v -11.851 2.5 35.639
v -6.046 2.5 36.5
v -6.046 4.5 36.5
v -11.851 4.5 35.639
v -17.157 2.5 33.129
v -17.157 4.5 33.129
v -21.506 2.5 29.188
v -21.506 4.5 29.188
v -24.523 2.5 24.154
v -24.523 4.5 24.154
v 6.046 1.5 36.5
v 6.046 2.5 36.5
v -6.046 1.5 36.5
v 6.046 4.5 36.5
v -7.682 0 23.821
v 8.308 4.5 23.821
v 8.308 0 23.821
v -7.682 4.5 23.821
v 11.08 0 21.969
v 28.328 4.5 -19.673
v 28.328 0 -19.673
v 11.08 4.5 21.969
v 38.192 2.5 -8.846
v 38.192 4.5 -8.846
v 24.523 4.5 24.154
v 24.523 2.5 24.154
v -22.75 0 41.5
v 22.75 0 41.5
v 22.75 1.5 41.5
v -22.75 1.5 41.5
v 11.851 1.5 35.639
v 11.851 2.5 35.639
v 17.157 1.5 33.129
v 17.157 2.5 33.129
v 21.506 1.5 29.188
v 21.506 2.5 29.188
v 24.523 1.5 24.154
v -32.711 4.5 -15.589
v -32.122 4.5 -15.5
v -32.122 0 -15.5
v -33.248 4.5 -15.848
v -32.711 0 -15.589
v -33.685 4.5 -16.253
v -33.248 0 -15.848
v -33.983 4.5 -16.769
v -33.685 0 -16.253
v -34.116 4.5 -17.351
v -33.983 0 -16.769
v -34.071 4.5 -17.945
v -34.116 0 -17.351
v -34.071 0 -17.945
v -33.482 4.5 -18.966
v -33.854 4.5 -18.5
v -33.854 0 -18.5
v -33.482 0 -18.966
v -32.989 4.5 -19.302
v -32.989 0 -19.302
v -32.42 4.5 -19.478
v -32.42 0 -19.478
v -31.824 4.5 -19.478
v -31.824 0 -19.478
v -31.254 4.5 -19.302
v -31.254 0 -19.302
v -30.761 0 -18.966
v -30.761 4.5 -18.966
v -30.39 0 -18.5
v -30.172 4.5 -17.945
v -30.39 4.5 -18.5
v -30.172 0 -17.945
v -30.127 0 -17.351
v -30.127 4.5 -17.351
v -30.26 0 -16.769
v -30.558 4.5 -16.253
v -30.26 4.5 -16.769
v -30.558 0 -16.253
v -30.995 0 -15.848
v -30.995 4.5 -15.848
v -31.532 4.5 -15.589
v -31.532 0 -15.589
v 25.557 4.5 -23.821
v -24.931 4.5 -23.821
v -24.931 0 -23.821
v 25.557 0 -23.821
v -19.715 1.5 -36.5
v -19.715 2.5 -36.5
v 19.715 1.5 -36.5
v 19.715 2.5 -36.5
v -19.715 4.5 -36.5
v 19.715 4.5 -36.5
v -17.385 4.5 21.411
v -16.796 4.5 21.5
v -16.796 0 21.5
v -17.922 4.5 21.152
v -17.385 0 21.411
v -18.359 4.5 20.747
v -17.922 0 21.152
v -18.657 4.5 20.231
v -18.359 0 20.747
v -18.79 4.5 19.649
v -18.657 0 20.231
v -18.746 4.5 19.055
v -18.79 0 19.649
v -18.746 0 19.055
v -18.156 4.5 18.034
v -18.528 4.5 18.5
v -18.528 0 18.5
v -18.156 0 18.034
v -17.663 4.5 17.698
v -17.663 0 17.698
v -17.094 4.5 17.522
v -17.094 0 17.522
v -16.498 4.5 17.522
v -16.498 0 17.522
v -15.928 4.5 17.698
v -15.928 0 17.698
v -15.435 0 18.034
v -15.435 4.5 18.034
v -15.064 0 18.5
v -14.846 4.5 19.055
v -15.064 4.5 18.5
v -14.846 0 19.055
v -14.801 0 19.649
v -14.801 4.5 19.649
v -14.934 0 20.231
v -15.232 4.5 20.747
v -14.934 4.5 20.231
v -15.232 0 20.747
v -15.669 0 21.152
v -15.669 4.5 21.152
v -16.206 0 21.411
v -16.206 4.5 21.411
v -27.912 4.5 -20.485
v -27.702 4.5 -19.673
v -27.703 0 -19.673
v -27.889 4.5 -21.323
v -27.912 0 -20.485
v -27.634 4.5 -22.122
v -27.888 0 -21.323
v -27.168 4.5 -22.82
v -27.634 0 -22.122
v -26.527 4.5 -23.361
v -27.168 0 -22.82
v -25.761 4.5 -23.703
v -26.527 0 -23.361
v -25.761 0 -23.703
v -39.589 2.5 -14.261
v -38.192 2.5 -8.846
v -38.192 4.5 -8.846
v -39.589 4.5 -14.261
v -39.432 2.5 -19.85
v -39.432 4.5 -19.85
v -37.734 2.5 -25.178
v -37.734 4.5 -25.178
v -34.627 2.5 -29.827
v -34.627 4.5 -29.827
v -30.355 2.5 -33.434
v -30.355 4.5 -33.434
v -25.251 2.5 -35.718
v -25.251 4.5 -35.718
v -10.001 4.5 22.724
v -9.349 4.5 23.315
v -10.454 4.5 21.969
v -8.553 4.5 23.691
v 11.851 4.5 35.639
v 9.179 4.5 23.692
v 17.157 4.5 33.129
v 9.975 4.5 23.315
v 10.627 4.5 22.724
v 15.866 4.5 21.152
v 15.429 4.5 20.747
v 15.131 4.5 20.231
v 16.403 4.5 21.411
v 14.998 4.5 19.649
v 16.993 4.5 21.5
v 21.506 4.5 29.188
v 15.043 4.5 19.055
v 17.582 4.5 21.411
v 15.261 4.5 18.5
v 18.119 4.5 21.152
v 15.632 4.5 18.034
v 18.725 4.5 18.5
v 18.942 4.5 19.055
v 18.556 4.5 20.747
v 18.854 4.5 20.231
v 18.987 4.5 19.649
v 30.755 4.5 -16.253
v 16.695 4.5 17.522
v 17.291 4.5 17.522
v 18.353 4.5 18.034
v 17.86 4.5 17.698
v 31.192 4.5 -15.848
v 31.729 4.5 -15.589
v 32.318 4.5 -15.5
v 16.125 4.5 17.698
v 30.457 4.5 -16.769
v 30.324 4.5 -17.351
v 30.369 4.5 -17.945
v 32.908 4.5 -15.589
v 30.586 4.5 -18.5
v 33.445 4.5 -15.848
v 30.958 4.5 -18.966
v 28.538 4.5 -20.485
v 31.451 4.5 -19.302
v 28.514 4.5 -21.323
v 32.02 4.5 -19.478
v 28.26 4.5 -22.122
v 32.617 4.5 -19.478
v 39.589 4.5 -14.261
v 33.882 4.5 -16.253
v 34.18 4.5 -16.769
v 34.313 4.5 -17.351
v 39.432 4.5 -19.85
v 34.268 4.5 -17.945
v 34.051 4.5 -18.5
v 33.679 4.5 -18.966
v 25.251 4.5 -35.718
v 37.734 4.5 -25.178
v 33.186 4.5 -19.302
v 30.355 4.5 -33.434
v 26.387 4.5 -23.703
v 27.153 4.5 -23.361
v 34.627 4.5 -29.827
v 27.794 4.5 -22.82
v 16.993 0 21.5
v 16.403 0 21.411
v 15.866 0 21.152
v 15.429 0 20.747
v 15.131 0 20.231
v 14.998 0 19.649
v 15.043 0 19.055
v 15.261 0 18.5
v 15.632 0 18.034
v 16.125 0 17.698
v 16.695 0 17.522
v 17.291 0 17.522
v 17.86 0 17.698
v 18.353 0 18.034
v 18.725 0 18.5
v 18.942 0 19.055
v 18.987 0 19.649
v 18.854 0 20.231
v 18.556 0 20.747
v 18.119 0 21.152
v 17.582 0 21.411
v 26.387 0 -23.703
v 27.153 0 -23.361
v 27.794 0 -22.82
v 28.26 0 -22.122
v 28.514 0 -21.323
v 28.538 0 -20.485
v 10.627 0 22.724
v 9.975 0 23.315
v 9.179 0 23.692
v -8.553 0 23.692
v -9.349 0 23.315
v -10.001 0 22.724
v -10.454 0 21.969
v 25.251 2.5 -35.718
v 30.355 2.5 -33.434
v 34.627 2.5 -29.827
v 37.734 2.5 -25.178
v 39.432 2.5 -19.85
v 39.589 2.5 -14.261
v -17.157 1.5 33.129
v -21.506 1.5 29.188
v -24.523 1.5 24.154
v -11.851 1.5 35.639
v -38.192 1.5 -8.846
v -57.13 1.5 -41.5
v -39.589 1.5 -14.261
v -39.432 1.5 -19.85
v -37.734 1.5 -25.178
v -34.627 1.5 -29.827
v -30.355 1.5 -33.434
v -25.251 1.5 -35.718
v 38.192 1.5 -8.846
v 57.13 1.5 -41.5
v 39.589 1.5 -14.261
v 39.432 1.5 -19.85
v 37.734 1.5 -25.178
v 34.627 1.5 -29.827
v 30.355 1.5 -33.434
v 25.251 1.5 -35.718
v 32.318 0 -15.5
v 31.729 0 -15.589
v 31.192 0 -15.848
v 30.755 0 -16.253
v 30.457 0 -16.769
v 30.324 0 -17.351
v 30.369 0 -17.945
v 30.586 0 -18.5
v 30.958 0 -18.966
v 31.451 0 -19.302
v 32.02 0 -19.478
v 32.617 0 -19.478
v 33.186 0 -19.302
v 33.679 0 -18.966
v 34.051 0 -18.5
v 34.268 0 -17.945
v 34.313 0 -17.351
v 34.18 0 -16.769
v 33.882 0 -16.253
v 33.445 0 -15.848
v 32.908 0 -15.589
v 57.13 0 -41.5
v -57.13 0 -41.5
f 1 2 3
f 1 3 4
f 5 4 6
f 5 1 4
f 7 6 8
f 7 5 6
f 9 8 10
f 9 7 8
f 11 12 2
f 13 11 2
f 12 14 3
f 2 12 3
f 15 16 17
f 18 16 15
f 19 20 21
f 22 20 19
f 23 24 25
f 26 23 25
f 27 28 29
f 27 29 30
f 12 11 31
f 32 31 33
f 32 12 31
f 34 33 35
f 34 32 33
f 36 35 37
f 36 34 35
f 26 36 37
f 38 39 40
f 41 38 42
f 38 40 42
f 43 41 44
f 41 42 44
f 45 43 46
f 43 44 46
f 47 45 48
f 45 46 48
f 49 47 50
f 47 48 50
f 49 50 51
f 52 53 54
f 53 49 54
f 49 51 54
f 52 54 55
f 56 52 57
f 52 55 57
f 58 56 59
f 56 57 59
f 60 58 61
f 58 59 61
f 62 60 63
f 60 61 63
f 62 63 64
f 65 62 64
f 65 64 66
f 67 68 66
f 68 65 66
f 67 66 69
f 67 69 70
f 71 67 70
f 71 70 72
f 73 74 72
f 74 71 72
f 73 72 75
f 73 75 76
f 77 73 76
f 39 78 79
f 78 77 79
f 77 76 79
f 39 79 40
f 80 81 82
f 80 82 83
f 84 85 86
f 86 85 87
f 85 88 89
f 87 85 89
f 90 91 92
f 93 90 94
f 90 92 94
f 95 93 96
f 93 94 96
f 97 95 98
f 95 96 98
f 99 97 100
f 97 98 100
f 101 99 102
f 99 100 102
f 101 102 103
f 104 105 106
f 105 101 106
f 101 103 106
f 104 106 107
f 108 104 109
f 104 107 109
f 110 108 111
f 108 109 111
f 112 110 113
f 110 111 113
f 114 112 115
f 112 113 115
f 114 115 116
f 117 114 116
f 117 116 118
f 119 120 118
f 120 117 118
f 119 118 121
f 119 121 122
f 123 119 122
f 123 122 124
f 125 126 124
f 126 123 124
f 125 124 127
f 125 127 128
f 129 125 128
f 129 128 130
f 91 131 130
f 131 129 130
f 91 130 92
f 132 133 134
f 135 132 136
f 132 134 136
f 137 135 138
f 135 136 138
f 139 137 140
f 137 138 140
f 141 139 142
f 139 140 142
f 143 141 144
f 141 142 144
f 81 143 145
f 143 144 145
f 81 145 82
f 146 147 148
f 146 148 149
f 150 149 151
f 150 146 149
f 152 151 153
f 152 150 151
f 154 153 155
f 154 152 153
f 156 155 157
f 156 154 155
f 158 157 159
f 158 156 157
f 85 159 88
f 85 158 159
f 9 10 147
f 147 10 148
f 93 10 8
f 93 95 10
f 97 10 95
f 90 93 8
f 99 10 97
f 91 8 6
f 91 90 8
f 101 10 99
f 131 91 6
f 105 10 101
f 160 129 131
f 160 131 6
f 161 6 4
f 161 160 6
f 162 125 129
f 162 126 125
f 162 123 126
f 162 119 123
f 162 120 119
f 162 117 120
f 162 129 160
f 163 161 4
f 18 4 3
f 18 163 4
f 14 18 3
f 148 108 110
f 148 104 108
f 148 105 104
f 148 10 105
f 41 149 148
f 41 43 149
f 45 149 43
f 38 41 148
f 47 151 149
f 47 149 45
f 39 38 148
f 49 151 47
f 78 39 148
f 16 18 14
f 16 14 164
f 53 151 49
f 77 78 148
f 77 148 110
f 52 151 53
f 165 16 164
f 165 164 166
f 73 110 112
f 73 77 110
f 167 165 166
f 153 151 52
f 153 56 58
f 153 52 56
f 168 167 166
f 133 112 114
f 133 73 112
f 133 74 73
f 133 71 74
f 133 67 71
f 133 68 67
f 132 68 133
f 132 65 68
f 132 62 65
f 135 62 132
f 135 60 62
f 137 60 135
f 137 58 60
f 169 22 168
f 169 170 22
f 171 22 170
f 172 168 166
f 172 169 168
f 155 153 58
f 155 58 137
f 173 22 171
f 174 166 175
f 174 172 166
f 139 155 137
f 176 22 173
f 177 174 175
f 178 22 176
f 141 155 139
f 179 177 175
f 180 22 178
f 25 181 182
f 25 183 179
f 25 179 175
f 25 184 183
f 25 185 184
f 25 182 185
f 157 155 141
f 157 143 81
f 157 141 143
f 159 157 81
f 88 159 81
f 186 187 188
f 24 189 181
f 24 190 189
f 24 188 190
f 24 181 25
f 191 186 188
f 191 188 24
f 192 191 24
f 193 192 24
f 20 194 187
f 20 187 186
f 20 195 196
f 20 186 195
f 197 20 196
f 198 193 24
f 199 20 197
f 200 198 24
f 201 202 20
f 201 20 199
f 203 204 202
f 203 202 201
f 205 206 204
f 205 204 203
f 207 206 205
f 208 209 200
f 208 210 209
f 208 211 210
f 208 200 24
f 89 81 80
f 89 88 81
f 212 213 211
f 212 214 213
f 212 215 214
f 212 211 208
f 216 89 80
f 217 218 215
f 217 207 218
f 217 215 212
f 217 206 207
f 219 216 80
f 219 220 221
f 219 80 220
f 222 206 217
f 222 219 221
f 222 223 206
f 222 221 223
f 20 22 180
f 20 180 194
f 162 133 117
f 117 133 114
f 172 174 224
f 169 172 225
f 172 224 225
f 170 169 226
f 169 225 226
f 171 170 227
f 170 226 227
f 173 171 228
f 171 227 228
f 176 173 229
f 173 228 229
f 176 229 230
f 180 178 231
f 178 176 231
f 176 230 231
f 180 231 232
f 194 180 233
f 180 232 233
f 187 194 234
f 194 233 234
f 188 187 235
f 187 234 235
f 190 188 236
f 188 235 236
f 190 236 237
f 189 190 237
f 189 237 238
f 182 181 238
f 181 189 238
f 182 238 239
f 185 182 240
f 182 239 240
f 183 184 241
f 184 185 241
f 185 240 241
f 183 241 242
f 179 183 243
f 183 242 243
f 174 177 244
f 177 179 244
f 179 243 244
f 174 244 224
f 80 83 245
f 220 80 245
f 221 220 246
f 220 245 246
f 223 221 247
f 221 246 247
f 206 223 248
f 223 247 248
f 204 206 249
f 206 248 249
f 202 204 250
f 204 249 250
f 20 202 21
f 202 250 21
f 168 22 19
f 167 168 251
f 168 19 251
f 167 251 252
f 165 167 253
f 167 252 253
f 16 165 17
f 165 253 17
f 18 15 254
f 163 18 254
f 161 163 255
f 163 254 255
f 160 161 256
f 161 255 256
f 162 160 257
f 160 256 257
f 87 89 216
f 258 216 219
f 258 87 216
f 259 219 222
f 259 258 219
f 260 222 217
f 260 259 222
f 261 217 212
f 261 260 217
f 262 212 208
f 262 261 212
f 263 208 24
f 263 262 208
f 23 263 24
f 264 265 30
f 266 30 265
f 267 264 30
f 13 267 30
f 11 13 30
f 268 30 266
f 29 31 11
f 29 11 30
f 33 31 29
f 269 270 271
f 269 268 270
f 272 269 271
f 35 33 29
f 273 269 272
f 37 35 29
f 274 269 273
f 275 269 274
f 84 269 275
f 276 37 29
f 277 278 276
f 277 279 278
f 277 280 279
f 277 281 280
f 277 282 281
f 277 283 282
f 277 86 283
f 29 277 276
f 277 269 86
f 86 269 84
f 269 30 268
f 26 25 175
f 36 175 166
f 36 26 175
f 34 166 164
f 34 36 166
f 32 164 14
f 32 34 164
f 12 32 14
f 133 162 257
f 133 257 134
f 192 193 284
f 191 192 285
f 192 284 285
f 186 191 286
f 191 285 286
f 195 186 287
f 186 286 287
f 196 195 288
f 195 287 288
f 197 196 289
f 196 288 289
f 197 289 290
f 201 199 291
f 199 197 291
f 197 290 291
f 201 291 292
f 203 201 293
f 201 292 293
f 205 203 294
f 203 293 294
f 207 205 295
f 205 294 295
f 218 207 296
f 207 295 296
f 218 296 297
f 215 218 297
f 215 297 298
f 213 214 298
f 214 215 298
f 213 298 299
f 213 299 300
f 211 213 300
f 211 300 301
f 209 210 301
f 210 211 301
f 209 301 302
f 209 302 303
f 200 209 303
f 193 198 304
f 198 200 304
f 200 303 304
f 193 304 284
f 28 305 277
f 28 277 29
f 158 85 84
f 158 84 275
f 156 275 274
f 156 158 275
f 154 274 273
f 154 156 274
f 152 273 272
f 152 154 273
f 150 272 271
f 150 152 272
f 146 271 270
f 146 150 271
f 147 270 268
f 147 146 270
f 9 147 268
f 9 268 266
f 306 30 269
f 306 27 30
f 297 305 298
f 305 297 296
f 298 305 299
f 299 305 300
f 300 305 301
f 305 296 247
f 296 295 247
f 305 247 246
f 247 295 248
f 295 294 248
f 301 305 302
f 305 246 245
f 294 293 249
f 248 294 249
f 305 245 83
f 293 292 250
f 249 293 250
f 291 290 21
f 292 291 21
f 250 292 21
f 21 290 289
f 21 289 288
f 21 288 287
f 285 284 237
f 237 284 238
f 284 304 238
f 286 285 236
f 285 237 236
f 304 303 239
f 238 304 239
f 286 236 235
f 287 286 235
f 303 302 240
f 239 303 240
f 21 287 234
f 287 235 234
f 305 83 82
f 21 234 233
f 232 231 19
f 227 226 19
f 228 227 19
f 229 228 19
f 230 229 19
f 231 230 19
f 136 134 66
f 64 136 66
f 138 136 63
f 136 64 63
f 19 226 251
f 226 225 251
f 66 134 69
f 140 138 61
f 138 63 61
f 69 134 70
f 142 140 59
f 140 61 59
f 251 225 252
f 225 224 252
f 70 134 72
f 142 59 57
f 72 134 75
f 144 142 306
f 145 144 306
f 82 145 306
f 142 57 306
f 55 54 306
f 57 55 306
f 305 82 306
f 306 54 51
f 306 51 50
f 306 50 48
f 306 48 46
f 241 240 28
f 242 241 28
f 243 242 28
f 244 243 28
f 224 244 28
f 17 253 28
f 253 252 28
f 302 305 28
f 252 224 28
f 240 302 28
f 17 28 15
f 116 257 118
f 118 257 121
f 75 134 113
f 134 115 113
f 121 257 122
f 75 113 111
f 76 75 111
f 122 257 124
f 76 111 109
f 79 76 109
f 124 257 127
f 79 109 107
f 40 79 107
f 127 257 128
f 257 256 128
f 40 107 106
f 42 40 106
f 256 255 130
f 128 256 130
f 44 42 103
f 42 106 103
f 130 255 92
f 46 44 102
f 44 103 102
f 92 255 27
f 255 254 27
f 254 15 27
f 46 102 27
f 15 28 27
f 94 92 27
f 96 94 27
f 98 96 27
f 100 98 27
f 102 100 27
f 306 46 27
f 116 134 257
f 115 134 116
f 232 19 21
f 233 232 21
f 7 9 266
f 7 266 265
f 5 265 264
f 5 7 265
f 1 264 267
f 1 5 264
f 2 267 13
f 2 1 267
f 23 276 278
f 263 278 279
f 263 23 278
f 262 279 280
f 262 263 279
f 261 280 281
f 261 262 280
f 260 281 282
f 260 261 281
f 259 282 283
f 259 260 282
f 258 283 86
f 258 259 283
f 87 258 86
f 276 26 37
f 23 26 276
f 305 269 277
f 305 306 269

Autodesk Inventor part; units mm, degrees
ref_plane "YZ Plane" through (0, 0, 0) normal (1, 0, 0) x (0, 1, 0)
ref_plane "XZ Plane" through (0, 0, 0) normal (0, 1, 0) x (-1, 0, 0)
ref_plane "XY Plane" through (0, 0, 0) normal (0, 0, 1) x (1, 0, 0)
sketch "Skizze1" plane through (0, 0, 0) normal (0, 1, 0) x (-1, 0, 0)
  line L0 (-22.75, 41.5) -> (22.75, 41.5)
  line L1 (22.75, 41.5) -> (57.1297, -41.5)
  line L2 (57.1297, -41.5) -> (-57.1297, -41.5)
  line L3 (-57.1297, -41.5) -> (-22.75, 41.5)
  line L4 (79.9816, 0) -> (-79.9816, 0) construction
  line L5 (0, -58.1) -> (0, 58.1) construction
  point P0 (0, 0)
  dimension "d0" = 83
  dimension "d1" = 112.5
  dimension "d2" = 45.5
extrude "Extrusion1" add sketch "Skizze1" along normal blind 6
sketch "Skizze2" plane through (0, 6, 0) normal (0, 1, 0) x (1, 0, 0)
  line L0 (-22.75, -41.5) -> (22.75, -41.5) projected
  line L1 (22.75, -41.5) -> (57.1297, 41.5) projected
  line L2 (57.1297, 41.5) -> (-57.1297, 41.5) projected
  line L3 (-57.1297, 41.5) -> (-22.75, -41.5) projected
  line L4 (-49.6467, 36.5) -> (49.6467, 36.5)
  line L5 (49.6467, 36.5) -> (19.4091, -36.5)
  line L6 (19.4091, -36.5) -> (-19.4091, -36.5)
  line L7 (-19.4091, -36.5) -> (-49.6467, 36.5)
  point P0 (0, 0)
  dimension "d5" = 5
extrude "Extrusion2" cut sketch "Skizze2" against normal blind 3.5
sketch "Skizze4" plane through (0, 6, 0) normal (0, 1, 0) x (1, 0, 0)
  line L0 (58.5766, 41.5) -> (-55.8797, 41.5) construction
  line L1 (-55.8797, 41.5) -> (-21.5, -41.5) construction
  line L2 (-21.5, -41.5) -> (24.1969, -41.5) construction
  line L3 (57.1297, 41.5) -> (22.75, -41.5) construction
  line L4 (22.4292, -40.7678) -> (56.8089, 42.2322) construction
  line L5 (-29.4207, 23.8207) -> (30.0466, 23.8207)
  line L6 (30.0466, 23.8207) -> (10.313, -23.8207)
  line L7 (10.313, -23.8207) -> (-9.687, -23.8207)
  line L8 (-9.687, -23.8207) -> (-29.4207, 23.8207)
  point P0 (0, 0)
  dimension "d15" = 20
extrude "Extrusion3" cut sketch "Skizze4" against normal through all
fillet "Rundung1" radius 3 4 edges at (30.0466, 3, -23.8207) (10.313, 3, 23.8207) (-9.687, 3, 23.8207) (-29.4207, 3, -23.8207)
sketch "Skizze5" plane through (0, 6, 0) normal (0, 1, 0) x (1, 0, 0)
  line L0 (-10.4541, -21.9687) -> (-27.7025, 19.6726) projected
  arc A0 (-24.9309, 23.8207) -> (-27.7025, 19.6726) centre (-24.9309, 20.8207) ccw projected
  line L1 (-24.9309, 23.8207) -> (25.5568, 23.8207) projected
  arc A1 (28.3284, 19.6726) -> (25.5568, 23.8207) centre (25.5568, 20.8207) ccw projected
  line L2 (28.3284, 19.6726) -> (11.0801, -21.9687) projected
  arc A2 (8.3084, -23.8207) -> (11.0801, -21.9687) centre (8.3084, -20.8207) ccw projected
  line L3 (8.3084, -23.8207) -> (-7.6825, -23.8207) projected
  arc A3 (-10.4541, -21.9687) -> (-7.6825, -23.8207) centre (-7.6825, -20.8207) ccw projected
  line L4 (-49.6467, 36.5) -> (-19.4091, -36.5) projected
  line L5 (-19.4091, -36.5) -> (19.4091, -36.5) projected
  line L6 (19.4091, -36.5) -> (49.6467, 36.5) projected
  line L7 (49.6467, 36.5) -> (-49.6467, 36.5) projected
  point P0 (0, 0)
extrude "Extrusion4" cut sketch "Skizze5" against normal blind 0.5
sketch "Skizze6" plane through (0, 5.5, 0) normal (0, 1, 0) x (1, 0, 0)
  circle A0 centre (-32.1216, 17.5) radius 4.7 construction
  circle A1 centre (-16.7957, -19.5) radius 4.7 construction
  circle A2 centre (16.9926, -19.5) radius 4.7 construction
  circle A3 centre (32.3185, 17.5) radius 4.7 construction
  line L0 (-24.9683, -43.2) -> (25.1652, -43.2) construction
  line L1 (25.1652, -43.2) -> (61.3675, 44.2) construction
  line L2 (61.3675, 44.2) -> (11.1438, 44.2) construction
  arc A4 (11.1438, 44.2) -> (-10.9469, 44.2) centre (0.0985, 34.5) ccw construction
  line L3 (-10.9469, 44.2) -> (-61.1705, 44.2) construction
  line L4 (-61.1705, 44.2) -> (-24.9683, -43.2) construction
  point P0 (0, 0)
  point P1 (-32.1216, 17.5)
  point P2 (-16.7957, -19.5)
  point P3 (16.9926, -19.5)
  point P4 (32.3185, 17.5)
hole "Bohrung2" at (-32.1216, 5.5, -17.5) at (-16.7957, 5.5, 19.5) at (16.9926, 5.5, 19.5) at (32.3185, 5.5, -17.5) direction (0, -1, 0) diameter 4 depth 8 tip angle 118
sketch "Skizze7" plane through (0, 5.5, 0) normal (0, 1, 0) x (1, 0, 0)
  circle A0 centre (16.9926, -19.5) radius 2 projected
  circle A1 centre (-32.1216, 17.5) radius 2 projected
  circle A2 centre (-16.7957, -19.5) radius 2 projected
  circle A3 centre (32.3185, 17.5) radius 2 projected
  arc A4 (-10.4541, -21.9687) -> (-7.6825, -23.8207) centre (-7.6825, -20.8207) ccw projected
  line L0 (-27.7025, 19.6726) -> (-10.4541, -21.9687) projected
  arc A5 (-24.9309, 23.8207) -> (-27.7025, 19.6726) centre (-24.9309, 20.8207) ccw projected
  line L1 (25.5568, 23.8207) -> (-24.9309, 23.8207) projected
  arc A6 (28.3284, 19.6726) -> (25.5568, 23.8207) centre (25.5568, 20.8207) ccw projected
  line L2 (11.0801, -21.9687) -> (28.3284, 19.6726) projected
  arc A7 (8.3084, -23.8207) -> (11.0801, -21.9687) centre (8.3084, -20.8207) ccw projected
  line L3 (-7.6825, -23.8207) -> (8.3084, -23.8207) projected
  line L4 (-19.4091, -36.5) -> (-49.6467, 36.5) projected
  line L5 (19.4091, -36.5) -> (-19.4091, -36.5) projected
  line L6 (49.6467, 36.5) -> (19.4091, -36.5) projected
  line L7 (-49.6467, 36.5) -> (49.6467, 36.5) projected
  point P0 (0, 0)
extrude "Extrusion5" cut sketch "Skizze7" against normal blind 1
fillet "Rundung2" radius 20 4 edges at (-19.4091, 3.5, 36.5) (19.4091, 3.5, 36.5) (49.6467, 3.5, -36.5) (-49.6467, 3.5, -36.5)
sketch "Skizze8" plane through (0, 2.5, 0) normal (0, 1, 0) x (1, 0, 0)
  line L0 (19.7146, 36.5) -> (-19.7146, 36.5) projected
  arc A0 (38.1922, 8.8463) -> (19.7146, 36.5) centre (19.7146, 16.5) ccw projected
  line L1 (24.5231, -24.1537) -> (38.1922, 8.8463) projected
  arc A1 (6.0455, -36.5) -> (24.5231, -24.1537) centre (6.0455, -16.5) ccw projected
  line L2 (-6.0455, -36.5) -> (6.0455, -36.5) projected
  arc A2 (-24.5231, -24.1537) -> (-6.0455, -36.5) centre (-6.0455, -16.5) ccw projected
  line L3 (-38.1922, 8.8463) -> (-24.5231, -24.1537) projected
  arc A3 (-19.7146, 36.5) -> (-38.1922, 8.8463) centre (-19.7146, 16.5) ccw projected
  line L4 (22.75, -41.5) -> (-22.75, -41.5) projected
  line L5 (57.1297, 41.5) -> (22.75, -41.5) projected
  line L6 (-57.1297, 41.5) -> (57.1297, 41.5) projected
  line L7 (-22.75, -41.5) -> (-57.1297, 41.5) projected
  point P0 (0, 0)
extrude "Extrusion6" cut sketch "Skizze8" against normal blind 1
properties part number "Stage2" material "ABS-Kunststoff"
